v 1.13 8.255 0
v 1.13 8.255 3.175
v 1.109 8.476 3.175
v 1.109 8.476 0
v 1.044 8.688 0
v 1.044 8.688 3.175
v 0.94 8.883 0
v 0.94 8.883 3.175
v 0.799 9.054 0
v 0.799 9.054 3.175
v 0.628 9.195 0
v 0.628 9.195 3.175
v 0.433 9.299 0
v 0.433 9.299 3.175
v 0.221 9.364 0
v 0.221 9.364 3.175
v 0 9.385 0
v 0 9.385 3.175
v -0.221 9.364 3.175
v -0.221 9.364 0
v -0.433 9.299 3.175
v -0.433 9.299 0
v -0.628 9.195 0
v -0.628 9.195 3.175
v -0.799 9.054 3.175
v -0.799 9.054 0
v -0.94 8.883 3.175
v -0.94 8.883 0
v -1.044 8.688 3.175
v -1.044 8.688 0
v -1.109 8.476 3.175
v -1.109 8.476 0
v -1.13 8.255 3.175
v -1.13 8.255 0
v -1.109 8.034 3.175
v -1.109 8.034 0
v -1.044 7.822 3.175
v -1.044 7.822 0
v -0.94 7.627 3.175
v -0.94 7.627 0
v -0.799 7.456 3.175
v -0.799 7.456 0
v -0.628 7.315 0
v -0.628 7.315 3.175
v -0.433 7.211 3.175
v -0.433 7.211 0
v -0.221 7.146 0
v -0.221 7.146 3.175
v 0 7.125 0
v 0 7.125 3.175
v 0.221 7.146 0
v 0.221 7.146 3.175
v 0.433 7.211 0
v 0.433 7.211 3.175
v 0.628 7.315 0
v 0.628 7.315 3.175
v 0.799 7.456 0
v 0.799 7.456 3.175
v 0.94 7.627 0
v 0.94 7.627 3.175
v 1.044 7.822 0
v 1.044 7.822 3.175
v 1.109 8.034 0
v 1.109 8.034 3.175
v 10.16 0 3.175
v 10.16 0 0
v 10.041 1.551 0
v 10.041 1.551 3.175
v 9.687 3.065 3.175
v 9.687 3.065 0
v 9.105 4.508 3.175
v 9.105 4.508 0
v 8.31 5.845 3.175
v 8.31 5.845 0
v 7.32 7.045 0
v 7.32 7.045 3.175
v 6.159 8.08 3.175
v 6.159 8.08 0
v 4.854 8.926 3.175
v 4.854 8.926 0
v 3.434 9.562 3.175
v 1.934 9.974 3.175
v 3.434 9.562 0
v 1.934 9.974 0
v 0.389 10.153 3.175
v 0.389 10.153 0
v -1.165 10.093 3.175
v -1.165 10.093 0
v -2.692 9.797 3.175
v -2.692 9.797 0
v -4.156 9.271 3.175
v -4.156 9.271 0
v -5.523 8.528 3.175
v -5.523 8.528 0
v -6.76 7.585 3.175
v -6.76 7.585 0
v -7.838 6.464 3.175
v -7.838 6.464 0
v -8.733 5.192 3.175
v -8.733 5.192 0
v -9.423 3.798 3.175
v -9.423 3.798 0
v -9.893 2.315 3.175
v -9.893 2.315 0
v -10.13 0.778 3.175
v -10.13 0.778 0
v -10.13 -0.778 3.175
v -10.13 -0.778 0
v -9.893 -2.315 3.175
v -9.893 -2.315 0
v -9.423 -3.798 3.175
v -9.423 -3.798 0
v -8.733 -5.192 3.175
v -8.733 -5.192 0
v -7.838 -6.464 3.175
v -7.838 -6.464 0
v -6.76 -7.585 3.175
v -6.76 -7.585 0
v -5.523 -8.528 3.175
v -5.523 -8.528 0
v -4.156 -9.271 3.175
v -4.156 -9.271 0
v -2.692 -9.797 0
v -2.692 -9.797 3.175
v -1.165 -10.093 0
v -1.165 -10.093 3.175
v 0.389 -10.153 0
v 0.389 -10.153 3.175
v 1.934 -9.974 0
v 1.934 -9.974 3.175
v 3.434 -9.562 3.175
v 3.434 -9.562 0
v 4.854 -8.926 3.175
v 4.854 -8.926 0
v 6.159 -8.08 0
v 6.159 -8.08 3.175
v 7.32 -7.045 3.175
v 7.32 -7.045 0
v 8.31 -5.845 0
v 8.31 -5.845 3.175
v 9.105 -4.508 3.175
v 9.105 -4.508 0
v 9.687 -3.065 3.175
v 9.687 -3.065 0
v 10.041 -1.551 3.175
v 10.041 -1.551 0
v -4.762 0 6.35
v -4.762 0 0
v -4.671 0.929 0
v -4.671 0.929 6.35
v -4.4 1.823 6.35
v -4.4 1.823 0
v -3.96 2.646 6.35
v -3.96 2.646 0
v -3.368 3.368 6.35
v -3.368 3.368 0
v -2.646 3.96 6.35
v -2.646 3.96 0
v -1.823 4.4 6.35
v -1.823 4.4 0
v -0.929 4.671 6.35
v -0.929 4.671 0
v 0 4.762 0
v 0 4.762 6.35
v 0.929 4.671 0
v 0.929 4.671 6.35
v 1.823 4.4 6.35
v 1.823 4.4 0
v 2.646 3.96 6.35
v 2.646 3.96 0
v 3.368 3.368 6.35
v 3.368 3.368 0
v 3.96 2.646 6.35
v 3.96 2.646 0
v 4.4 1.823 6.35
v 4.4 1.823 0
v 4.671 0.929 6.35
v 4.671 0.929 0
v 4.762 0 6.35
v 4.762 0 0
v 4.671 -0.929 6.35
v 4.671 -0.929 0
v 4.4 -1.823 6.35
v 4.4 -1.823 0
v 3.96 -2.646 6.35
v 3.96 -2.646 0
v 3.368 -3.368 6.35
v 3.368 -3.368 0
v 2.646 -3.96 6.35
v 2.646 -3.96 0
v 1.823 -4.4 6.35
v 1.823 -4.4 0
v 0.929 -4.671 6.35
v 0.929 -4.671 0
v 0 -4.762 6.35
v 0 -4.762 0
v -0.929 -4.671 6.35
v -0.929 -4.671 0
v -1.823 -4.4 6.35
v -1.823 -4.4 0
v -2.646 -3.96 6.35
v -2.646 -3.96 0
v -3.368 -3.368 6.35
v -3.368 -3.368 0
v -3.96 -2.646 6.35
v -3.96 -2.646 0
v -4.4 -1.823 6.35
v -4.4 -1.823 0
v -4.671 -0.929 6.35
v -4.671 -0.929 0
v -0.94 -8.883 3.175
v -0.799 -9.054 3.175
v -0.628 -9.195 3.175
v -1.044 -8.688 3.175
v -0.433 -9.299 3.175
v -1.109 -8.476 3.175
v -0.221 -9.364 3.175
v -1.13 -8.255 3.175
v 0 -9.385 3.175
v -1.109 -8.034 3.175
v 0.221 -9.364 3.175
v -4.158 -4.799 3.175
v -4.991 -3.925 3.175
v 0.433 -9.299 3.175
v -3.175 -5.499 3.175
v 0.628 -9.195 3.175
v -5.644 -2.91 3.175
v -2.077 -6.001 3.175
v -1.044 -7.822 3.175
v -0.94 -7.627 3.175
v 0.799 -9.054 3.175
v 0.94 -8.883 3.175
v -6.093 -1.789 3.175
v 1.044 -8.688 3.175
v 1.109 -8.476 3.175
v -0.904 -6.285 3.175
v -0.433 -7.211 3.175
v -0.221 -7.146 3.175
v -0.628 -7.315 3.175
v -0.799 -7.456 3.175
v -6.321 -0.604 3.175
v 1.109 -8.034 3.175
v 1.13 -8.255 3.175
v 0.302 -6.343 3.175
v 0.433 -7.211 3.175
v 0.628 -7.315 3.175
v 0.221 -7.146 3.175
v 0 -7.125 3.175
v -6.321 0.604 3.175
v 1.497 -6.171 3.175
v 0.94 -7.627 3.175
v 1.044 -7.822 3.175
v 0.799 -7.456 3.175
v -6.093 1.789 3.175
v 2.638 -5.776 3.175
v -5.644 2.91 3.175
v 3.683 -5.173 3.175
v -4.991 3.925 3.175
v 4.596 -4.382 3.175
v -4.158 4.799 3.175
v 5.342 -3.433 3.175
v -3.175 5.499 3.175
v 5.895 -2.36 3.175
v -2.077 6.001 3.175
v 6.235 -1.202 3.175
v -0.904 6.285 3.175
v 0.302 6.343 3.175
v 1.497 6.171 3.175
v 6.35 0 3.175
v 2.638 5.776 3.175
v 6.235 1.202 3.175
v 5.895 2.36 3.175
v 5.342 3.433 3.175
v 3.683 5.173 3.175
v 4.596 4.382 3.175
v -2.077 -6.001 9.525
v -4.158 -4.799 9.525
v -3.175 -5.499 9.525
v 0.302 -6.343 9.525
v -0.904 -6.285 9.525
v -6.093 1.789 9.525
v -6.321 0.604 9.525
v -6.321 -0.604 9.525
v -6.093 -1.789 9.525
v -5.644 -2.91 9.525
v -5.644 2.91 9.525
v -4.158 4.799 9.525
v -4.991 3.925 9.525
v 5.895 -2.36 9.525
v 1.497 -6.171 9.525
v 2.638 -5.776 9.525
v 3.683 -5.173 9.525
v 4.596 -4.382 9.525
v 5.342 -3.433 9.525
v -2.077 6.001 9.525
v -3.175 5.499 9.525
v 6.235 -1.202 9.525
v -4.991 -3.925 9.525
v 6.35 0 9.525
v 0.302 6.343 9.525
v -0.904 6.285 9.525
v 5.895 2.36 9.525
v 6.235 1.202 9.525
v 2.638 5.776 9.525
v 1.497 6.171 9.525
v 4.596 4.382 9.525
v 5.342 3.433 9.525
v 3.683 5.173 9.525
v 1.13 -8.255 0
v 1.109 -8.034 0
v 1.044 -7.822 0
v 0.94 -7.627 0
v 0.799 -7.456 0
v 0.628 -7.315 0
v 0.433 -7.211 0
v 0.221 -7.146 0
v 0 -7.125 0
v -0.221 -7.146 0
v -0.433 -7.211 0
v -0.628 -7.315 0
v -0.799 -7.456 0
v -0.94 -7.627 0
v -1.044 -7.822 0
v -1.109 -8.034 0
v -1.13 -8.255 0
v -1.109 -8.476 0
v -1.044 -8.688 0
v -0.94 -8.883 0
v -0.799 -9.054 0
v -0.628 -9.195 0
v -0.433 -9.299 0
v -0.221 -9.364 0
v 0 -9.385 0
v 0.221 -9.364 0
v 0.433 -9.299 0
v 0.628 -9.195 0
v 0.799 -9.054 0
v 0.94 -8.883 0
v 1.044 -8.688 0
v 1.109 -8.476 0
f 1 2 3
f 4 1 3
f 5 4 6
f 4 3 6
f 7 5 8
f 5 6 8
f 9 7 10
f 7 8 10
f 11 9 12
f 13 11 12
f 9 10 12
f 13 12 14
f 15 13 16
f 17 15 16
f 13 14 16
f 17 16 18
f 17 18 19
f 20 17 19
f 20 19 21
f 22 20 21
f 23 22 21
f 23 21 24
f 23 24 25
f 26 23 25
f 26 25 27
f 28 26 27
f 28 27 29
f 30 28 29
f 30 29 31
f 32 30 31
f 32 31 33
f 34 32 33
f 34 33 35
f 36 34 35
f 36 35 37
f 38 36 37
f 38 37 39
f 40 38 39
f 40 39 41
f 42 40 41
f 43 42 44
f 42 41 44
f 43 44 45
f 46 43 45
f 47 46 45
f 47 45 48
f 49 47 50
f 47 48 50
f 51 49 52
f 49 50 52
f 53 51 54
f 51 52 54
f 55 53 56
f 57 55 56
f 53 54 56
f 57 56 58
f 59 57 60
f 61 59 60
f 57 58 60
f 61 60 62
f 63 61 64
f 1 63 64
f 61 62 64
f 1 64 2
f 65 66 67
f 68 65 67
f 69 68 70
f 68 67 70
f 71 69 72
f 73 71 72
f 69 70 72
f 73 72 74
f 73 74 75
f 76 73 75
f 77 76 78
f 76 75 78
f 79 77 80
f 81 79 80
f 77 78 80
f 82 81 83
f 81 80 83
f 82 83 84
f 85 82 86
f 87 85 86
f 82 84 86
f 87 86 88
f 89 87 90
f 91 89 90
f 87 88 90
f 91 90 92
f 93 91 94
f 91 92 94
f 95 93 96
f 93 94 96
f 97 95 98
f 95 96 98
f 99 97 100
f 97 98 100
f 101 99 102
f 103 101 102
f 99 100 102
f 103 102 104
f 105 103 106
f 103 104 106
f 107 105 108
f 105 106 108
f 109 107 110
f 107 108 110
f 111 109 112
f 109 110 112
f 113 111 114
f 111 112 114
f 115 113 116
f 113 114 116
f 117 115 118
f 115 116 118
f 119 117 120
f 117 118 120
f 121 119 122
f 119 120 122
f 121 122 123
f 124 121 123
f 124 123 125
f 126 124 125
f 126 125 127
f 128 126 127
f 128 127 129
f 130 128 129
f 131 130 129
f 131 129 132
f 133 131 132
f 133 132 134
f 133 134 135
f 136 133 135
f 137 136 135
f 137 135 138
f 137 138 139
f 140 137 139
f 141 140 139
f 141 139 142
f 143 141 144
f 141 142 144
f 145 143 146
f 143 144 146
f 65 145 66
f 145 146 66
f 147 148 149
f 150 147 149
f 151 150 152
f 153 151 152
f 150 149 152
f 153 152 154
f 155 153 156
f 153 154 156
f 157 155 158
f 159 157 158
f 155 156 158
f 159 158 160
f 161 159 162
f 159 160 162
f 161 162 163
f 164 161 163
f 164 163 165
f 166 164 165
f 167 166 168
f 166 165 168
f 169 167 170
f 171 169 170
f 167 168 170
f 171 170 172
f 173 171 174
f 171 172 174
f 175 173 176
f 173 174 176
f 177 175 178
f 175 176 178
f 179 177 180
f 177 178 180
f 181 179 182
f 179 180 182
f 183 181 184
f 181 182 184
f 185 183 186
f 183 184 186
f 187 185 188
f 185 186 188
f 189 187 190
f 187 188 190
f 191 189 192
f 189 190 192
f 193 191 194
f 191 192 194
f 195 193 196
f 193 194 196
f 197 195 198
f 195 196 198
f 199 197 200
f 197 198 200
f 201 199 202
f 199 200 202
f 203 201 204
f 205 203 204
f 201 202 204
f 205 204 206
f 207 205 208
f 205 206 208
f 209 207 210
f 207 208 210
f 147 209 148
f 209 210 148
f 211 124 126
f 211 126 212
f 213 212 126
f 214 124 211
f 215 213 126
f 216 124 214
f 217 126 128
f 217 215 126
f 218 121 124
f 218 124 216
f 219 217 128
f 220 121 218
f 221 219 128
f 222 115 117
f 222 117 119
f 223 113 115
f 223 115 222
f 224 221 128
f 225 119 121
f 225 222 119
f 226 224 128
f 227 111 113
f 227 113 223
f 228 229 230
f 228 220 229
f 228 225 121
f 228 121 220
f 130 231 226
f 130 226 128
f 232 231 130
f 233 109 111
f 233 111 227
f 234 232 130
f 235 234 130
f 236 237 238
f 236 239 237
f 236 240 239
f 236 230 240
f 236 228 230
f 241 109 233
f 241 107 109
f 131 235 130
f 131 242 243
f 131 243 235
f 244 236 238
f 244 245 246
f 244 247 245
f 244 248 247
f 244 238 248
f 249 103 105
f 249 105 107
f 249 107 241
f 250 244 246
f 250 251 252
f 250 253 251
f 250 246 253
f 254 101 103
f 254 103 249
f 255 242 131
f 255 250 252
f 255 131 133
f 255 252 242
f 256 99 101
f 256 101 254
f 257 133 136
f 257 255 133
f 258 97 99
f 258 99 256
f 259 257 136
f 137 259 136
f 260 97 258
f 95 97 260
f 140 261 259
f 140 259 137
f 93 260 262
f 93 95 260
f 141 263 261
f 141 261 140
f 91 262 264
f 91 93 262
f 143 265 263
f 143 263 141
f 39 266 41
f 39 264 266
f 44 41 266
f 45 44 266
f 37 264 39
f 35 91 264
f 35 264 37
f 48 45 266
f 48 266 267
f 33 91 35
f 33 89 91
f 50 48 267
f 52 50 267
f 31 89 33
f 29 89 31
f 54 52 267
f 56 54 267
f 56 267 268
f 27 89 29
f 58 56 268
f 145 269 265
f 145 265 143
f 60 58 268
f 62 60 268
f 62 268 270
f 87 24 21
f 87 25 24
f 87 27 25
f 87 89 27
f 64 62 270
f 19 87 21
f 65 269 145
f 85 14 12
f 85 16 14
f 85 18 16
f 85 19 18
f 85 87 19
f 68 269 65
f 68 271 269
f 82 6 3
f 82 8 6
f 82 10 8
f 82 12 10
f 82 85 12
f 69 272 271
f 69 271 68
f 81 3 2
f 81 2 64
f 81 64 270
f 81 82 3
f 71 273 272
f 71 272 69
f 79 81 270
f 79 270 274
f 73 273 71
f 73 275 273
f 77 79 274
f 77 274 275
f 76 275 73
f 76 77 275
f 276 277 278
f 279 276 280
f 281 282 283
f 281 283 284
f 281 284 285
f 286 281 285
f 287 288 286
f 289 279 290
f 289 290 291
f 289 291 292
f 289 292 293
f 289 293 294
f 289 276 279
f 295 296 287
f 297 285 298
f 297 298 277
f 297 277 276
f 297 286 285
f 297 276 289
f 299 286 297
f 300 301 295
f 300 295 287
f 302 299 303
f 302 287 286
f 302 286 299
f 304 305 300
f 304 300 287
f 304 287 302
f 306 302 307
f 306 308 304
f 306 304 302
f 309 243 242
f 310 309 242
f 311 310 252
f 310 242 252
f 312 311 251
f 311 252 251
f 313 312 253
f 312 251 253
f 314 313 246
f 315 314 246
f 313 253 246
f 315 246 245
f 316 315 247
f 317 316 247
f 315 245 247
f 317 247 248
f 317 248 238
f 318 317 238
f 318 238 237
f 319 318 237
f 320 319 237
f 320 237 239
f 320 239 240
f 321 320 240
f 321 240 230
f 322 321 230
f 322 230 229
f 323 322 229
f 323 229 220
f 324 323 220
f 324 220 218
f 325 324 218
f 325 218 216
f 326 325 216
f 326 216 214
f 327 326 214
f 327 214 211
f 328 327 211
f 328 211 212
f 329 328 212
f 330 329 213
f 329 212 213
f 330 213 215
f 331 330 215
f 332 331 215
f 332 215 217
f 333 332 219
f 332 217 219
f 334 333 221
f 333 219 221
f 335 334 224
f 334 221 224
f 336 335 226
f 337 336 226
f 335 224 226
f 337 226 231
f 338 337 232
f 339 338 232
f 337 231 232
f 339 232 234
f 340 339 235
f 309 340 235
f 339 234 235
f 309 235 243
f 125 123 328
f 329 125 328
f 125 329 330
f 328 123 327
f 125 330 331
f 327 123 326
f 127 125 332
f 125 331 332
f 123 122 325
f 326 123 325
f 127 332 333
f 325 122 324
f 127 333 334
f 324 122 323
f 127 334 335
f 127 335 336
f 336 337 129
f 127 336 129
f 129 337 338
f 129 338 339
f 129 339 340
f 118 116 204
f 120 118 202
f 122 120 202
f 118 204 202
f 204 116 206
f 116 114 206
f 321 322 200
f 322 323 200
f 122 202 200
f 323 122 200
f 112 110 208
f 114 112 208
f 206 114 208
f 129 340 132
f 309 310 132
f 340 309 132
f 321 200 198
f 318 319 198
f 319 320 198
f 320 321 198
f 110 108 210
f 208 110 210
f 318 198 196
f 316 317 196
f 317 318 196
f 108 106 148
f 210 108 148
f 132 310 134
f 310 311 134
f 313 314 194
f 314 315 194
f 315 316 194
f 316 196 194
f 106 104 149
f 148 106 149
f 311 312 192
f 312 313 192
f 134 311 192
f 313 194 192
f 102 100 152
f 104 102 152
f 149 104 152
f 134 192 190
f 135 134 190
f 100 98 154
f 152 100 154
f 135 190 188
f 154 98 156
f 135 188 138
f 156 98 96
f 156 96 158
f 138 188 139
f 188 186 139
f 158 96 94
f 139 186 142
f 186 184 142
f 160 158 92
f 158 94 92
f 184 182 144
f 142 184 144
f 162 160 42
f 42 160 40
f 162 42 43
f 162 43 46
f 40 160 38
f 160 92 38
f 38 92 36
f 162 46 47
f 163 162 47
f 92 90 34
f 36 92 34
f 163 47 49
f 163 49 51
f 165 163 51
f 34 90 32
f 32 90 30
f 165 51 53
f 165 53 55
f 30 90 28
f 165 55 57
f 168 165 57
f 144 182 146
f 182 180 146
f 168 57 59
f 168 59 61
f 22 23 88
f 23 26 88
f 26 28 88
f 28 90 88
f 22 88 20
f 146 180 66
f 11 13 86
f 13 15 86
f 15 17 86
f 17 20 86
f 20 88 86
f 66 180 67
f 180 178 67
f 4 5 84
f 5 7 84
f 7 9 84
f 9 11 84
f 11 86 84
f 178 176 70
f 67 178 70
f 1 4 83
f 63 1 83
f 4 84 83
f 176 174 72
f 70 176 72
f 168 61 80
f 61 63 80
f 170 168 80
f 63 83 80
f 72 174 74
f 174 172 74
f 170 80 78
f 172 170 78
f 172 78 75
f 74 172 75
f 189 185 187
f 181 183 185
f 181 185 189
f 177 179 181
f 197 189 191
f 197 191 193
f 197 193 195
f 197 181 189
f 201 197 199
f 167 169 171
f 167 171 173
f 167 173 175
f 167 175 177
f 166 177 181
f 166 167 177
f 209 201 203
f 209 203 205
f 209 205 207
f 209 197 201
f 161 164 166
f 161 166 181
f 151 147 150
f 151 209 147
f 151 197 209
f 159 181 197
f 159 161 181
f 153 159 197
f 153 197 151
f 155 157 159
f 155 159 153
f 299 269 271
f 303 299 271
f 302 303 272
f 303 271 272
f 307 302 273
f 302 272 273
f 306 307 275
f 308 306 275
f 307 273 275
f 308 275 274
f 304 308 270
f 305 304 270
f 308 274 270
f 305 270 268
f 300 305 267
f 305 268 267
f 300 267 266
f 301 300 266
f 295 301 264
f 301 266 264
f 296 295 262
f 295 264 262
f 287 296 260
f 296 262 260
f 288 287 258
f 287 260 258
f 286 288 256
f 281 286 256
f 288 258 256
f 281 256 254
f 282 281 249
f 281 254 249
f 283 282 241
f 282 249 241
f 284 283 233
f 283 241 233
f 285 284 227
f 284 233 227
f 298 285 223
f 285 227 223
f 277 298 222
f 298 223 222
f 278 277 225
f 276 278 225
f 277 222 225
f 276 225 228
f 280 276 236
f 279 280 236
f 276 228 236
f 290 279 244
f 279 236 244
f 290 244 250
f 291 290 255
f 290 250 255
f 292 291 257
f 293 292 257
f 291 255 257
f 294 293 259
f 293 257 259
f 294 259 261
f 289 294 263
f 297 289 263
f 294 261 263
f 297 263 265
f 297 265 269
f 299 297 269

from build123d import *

# Parameters (mm, degrees)
SKETCH1_R           = 10.16
BOSS_EXTRUDE2_DEPTH = 3.175
SKETCH4_R           = 6.35
BOSS_EXTRUDE3_DEPTH = 6.35
SKETCH5_R           = 4.7625
CUT_EXTRUDE3_DEPTH  = 6.35
SKETCH6_R           = 1.1303
CUT_EXTRUDE4_DEPTH  = 16.709032434


with BuildPart() as part:
    # Sketch1 → Boss-Extrude2 (new body)
    with BuildSketch(Plane.XY):
        Circle(SKETCH1_R)
    extrude(amount=BOSS_EXTRUDE2_DEPTH)

    # Sketch4 → Boss-Extrude3 (add)
    with BuildSketch(Plane.XY.offset(3.175)):
        Circle(SKETCH4_R)
    extrude(amount=BOSS_EXTRUDE3_DEPTH)

    # Sketch5 → Cut-Extrude3 (cut)
    with BuildSketch(Plane(origin=(0, 0, 0), x_dir=(-1, 0, 0), z_dir=(0, 0, -1))):
        Circle(SKETCH5_R)
    extrude(amount=-CUT_EXTRUDE3_DEPTH, mode=Mode.SUBTRACT)

    # Sketch6 → Cut-Extrude4 (cut, through all)
    with BuildSketch(Plane.XY.offset(3.175)):
        with Locations((0, 8.255)):
            Circle(SKETCH6_R)
        with Locations((0, -8.255)):
            Circle(SKETCH6_R)
    extrude(amount=-CUT_EXTRUDE4_DEPTH, mode=Mode.SUBTRACT)


solid = part.part
